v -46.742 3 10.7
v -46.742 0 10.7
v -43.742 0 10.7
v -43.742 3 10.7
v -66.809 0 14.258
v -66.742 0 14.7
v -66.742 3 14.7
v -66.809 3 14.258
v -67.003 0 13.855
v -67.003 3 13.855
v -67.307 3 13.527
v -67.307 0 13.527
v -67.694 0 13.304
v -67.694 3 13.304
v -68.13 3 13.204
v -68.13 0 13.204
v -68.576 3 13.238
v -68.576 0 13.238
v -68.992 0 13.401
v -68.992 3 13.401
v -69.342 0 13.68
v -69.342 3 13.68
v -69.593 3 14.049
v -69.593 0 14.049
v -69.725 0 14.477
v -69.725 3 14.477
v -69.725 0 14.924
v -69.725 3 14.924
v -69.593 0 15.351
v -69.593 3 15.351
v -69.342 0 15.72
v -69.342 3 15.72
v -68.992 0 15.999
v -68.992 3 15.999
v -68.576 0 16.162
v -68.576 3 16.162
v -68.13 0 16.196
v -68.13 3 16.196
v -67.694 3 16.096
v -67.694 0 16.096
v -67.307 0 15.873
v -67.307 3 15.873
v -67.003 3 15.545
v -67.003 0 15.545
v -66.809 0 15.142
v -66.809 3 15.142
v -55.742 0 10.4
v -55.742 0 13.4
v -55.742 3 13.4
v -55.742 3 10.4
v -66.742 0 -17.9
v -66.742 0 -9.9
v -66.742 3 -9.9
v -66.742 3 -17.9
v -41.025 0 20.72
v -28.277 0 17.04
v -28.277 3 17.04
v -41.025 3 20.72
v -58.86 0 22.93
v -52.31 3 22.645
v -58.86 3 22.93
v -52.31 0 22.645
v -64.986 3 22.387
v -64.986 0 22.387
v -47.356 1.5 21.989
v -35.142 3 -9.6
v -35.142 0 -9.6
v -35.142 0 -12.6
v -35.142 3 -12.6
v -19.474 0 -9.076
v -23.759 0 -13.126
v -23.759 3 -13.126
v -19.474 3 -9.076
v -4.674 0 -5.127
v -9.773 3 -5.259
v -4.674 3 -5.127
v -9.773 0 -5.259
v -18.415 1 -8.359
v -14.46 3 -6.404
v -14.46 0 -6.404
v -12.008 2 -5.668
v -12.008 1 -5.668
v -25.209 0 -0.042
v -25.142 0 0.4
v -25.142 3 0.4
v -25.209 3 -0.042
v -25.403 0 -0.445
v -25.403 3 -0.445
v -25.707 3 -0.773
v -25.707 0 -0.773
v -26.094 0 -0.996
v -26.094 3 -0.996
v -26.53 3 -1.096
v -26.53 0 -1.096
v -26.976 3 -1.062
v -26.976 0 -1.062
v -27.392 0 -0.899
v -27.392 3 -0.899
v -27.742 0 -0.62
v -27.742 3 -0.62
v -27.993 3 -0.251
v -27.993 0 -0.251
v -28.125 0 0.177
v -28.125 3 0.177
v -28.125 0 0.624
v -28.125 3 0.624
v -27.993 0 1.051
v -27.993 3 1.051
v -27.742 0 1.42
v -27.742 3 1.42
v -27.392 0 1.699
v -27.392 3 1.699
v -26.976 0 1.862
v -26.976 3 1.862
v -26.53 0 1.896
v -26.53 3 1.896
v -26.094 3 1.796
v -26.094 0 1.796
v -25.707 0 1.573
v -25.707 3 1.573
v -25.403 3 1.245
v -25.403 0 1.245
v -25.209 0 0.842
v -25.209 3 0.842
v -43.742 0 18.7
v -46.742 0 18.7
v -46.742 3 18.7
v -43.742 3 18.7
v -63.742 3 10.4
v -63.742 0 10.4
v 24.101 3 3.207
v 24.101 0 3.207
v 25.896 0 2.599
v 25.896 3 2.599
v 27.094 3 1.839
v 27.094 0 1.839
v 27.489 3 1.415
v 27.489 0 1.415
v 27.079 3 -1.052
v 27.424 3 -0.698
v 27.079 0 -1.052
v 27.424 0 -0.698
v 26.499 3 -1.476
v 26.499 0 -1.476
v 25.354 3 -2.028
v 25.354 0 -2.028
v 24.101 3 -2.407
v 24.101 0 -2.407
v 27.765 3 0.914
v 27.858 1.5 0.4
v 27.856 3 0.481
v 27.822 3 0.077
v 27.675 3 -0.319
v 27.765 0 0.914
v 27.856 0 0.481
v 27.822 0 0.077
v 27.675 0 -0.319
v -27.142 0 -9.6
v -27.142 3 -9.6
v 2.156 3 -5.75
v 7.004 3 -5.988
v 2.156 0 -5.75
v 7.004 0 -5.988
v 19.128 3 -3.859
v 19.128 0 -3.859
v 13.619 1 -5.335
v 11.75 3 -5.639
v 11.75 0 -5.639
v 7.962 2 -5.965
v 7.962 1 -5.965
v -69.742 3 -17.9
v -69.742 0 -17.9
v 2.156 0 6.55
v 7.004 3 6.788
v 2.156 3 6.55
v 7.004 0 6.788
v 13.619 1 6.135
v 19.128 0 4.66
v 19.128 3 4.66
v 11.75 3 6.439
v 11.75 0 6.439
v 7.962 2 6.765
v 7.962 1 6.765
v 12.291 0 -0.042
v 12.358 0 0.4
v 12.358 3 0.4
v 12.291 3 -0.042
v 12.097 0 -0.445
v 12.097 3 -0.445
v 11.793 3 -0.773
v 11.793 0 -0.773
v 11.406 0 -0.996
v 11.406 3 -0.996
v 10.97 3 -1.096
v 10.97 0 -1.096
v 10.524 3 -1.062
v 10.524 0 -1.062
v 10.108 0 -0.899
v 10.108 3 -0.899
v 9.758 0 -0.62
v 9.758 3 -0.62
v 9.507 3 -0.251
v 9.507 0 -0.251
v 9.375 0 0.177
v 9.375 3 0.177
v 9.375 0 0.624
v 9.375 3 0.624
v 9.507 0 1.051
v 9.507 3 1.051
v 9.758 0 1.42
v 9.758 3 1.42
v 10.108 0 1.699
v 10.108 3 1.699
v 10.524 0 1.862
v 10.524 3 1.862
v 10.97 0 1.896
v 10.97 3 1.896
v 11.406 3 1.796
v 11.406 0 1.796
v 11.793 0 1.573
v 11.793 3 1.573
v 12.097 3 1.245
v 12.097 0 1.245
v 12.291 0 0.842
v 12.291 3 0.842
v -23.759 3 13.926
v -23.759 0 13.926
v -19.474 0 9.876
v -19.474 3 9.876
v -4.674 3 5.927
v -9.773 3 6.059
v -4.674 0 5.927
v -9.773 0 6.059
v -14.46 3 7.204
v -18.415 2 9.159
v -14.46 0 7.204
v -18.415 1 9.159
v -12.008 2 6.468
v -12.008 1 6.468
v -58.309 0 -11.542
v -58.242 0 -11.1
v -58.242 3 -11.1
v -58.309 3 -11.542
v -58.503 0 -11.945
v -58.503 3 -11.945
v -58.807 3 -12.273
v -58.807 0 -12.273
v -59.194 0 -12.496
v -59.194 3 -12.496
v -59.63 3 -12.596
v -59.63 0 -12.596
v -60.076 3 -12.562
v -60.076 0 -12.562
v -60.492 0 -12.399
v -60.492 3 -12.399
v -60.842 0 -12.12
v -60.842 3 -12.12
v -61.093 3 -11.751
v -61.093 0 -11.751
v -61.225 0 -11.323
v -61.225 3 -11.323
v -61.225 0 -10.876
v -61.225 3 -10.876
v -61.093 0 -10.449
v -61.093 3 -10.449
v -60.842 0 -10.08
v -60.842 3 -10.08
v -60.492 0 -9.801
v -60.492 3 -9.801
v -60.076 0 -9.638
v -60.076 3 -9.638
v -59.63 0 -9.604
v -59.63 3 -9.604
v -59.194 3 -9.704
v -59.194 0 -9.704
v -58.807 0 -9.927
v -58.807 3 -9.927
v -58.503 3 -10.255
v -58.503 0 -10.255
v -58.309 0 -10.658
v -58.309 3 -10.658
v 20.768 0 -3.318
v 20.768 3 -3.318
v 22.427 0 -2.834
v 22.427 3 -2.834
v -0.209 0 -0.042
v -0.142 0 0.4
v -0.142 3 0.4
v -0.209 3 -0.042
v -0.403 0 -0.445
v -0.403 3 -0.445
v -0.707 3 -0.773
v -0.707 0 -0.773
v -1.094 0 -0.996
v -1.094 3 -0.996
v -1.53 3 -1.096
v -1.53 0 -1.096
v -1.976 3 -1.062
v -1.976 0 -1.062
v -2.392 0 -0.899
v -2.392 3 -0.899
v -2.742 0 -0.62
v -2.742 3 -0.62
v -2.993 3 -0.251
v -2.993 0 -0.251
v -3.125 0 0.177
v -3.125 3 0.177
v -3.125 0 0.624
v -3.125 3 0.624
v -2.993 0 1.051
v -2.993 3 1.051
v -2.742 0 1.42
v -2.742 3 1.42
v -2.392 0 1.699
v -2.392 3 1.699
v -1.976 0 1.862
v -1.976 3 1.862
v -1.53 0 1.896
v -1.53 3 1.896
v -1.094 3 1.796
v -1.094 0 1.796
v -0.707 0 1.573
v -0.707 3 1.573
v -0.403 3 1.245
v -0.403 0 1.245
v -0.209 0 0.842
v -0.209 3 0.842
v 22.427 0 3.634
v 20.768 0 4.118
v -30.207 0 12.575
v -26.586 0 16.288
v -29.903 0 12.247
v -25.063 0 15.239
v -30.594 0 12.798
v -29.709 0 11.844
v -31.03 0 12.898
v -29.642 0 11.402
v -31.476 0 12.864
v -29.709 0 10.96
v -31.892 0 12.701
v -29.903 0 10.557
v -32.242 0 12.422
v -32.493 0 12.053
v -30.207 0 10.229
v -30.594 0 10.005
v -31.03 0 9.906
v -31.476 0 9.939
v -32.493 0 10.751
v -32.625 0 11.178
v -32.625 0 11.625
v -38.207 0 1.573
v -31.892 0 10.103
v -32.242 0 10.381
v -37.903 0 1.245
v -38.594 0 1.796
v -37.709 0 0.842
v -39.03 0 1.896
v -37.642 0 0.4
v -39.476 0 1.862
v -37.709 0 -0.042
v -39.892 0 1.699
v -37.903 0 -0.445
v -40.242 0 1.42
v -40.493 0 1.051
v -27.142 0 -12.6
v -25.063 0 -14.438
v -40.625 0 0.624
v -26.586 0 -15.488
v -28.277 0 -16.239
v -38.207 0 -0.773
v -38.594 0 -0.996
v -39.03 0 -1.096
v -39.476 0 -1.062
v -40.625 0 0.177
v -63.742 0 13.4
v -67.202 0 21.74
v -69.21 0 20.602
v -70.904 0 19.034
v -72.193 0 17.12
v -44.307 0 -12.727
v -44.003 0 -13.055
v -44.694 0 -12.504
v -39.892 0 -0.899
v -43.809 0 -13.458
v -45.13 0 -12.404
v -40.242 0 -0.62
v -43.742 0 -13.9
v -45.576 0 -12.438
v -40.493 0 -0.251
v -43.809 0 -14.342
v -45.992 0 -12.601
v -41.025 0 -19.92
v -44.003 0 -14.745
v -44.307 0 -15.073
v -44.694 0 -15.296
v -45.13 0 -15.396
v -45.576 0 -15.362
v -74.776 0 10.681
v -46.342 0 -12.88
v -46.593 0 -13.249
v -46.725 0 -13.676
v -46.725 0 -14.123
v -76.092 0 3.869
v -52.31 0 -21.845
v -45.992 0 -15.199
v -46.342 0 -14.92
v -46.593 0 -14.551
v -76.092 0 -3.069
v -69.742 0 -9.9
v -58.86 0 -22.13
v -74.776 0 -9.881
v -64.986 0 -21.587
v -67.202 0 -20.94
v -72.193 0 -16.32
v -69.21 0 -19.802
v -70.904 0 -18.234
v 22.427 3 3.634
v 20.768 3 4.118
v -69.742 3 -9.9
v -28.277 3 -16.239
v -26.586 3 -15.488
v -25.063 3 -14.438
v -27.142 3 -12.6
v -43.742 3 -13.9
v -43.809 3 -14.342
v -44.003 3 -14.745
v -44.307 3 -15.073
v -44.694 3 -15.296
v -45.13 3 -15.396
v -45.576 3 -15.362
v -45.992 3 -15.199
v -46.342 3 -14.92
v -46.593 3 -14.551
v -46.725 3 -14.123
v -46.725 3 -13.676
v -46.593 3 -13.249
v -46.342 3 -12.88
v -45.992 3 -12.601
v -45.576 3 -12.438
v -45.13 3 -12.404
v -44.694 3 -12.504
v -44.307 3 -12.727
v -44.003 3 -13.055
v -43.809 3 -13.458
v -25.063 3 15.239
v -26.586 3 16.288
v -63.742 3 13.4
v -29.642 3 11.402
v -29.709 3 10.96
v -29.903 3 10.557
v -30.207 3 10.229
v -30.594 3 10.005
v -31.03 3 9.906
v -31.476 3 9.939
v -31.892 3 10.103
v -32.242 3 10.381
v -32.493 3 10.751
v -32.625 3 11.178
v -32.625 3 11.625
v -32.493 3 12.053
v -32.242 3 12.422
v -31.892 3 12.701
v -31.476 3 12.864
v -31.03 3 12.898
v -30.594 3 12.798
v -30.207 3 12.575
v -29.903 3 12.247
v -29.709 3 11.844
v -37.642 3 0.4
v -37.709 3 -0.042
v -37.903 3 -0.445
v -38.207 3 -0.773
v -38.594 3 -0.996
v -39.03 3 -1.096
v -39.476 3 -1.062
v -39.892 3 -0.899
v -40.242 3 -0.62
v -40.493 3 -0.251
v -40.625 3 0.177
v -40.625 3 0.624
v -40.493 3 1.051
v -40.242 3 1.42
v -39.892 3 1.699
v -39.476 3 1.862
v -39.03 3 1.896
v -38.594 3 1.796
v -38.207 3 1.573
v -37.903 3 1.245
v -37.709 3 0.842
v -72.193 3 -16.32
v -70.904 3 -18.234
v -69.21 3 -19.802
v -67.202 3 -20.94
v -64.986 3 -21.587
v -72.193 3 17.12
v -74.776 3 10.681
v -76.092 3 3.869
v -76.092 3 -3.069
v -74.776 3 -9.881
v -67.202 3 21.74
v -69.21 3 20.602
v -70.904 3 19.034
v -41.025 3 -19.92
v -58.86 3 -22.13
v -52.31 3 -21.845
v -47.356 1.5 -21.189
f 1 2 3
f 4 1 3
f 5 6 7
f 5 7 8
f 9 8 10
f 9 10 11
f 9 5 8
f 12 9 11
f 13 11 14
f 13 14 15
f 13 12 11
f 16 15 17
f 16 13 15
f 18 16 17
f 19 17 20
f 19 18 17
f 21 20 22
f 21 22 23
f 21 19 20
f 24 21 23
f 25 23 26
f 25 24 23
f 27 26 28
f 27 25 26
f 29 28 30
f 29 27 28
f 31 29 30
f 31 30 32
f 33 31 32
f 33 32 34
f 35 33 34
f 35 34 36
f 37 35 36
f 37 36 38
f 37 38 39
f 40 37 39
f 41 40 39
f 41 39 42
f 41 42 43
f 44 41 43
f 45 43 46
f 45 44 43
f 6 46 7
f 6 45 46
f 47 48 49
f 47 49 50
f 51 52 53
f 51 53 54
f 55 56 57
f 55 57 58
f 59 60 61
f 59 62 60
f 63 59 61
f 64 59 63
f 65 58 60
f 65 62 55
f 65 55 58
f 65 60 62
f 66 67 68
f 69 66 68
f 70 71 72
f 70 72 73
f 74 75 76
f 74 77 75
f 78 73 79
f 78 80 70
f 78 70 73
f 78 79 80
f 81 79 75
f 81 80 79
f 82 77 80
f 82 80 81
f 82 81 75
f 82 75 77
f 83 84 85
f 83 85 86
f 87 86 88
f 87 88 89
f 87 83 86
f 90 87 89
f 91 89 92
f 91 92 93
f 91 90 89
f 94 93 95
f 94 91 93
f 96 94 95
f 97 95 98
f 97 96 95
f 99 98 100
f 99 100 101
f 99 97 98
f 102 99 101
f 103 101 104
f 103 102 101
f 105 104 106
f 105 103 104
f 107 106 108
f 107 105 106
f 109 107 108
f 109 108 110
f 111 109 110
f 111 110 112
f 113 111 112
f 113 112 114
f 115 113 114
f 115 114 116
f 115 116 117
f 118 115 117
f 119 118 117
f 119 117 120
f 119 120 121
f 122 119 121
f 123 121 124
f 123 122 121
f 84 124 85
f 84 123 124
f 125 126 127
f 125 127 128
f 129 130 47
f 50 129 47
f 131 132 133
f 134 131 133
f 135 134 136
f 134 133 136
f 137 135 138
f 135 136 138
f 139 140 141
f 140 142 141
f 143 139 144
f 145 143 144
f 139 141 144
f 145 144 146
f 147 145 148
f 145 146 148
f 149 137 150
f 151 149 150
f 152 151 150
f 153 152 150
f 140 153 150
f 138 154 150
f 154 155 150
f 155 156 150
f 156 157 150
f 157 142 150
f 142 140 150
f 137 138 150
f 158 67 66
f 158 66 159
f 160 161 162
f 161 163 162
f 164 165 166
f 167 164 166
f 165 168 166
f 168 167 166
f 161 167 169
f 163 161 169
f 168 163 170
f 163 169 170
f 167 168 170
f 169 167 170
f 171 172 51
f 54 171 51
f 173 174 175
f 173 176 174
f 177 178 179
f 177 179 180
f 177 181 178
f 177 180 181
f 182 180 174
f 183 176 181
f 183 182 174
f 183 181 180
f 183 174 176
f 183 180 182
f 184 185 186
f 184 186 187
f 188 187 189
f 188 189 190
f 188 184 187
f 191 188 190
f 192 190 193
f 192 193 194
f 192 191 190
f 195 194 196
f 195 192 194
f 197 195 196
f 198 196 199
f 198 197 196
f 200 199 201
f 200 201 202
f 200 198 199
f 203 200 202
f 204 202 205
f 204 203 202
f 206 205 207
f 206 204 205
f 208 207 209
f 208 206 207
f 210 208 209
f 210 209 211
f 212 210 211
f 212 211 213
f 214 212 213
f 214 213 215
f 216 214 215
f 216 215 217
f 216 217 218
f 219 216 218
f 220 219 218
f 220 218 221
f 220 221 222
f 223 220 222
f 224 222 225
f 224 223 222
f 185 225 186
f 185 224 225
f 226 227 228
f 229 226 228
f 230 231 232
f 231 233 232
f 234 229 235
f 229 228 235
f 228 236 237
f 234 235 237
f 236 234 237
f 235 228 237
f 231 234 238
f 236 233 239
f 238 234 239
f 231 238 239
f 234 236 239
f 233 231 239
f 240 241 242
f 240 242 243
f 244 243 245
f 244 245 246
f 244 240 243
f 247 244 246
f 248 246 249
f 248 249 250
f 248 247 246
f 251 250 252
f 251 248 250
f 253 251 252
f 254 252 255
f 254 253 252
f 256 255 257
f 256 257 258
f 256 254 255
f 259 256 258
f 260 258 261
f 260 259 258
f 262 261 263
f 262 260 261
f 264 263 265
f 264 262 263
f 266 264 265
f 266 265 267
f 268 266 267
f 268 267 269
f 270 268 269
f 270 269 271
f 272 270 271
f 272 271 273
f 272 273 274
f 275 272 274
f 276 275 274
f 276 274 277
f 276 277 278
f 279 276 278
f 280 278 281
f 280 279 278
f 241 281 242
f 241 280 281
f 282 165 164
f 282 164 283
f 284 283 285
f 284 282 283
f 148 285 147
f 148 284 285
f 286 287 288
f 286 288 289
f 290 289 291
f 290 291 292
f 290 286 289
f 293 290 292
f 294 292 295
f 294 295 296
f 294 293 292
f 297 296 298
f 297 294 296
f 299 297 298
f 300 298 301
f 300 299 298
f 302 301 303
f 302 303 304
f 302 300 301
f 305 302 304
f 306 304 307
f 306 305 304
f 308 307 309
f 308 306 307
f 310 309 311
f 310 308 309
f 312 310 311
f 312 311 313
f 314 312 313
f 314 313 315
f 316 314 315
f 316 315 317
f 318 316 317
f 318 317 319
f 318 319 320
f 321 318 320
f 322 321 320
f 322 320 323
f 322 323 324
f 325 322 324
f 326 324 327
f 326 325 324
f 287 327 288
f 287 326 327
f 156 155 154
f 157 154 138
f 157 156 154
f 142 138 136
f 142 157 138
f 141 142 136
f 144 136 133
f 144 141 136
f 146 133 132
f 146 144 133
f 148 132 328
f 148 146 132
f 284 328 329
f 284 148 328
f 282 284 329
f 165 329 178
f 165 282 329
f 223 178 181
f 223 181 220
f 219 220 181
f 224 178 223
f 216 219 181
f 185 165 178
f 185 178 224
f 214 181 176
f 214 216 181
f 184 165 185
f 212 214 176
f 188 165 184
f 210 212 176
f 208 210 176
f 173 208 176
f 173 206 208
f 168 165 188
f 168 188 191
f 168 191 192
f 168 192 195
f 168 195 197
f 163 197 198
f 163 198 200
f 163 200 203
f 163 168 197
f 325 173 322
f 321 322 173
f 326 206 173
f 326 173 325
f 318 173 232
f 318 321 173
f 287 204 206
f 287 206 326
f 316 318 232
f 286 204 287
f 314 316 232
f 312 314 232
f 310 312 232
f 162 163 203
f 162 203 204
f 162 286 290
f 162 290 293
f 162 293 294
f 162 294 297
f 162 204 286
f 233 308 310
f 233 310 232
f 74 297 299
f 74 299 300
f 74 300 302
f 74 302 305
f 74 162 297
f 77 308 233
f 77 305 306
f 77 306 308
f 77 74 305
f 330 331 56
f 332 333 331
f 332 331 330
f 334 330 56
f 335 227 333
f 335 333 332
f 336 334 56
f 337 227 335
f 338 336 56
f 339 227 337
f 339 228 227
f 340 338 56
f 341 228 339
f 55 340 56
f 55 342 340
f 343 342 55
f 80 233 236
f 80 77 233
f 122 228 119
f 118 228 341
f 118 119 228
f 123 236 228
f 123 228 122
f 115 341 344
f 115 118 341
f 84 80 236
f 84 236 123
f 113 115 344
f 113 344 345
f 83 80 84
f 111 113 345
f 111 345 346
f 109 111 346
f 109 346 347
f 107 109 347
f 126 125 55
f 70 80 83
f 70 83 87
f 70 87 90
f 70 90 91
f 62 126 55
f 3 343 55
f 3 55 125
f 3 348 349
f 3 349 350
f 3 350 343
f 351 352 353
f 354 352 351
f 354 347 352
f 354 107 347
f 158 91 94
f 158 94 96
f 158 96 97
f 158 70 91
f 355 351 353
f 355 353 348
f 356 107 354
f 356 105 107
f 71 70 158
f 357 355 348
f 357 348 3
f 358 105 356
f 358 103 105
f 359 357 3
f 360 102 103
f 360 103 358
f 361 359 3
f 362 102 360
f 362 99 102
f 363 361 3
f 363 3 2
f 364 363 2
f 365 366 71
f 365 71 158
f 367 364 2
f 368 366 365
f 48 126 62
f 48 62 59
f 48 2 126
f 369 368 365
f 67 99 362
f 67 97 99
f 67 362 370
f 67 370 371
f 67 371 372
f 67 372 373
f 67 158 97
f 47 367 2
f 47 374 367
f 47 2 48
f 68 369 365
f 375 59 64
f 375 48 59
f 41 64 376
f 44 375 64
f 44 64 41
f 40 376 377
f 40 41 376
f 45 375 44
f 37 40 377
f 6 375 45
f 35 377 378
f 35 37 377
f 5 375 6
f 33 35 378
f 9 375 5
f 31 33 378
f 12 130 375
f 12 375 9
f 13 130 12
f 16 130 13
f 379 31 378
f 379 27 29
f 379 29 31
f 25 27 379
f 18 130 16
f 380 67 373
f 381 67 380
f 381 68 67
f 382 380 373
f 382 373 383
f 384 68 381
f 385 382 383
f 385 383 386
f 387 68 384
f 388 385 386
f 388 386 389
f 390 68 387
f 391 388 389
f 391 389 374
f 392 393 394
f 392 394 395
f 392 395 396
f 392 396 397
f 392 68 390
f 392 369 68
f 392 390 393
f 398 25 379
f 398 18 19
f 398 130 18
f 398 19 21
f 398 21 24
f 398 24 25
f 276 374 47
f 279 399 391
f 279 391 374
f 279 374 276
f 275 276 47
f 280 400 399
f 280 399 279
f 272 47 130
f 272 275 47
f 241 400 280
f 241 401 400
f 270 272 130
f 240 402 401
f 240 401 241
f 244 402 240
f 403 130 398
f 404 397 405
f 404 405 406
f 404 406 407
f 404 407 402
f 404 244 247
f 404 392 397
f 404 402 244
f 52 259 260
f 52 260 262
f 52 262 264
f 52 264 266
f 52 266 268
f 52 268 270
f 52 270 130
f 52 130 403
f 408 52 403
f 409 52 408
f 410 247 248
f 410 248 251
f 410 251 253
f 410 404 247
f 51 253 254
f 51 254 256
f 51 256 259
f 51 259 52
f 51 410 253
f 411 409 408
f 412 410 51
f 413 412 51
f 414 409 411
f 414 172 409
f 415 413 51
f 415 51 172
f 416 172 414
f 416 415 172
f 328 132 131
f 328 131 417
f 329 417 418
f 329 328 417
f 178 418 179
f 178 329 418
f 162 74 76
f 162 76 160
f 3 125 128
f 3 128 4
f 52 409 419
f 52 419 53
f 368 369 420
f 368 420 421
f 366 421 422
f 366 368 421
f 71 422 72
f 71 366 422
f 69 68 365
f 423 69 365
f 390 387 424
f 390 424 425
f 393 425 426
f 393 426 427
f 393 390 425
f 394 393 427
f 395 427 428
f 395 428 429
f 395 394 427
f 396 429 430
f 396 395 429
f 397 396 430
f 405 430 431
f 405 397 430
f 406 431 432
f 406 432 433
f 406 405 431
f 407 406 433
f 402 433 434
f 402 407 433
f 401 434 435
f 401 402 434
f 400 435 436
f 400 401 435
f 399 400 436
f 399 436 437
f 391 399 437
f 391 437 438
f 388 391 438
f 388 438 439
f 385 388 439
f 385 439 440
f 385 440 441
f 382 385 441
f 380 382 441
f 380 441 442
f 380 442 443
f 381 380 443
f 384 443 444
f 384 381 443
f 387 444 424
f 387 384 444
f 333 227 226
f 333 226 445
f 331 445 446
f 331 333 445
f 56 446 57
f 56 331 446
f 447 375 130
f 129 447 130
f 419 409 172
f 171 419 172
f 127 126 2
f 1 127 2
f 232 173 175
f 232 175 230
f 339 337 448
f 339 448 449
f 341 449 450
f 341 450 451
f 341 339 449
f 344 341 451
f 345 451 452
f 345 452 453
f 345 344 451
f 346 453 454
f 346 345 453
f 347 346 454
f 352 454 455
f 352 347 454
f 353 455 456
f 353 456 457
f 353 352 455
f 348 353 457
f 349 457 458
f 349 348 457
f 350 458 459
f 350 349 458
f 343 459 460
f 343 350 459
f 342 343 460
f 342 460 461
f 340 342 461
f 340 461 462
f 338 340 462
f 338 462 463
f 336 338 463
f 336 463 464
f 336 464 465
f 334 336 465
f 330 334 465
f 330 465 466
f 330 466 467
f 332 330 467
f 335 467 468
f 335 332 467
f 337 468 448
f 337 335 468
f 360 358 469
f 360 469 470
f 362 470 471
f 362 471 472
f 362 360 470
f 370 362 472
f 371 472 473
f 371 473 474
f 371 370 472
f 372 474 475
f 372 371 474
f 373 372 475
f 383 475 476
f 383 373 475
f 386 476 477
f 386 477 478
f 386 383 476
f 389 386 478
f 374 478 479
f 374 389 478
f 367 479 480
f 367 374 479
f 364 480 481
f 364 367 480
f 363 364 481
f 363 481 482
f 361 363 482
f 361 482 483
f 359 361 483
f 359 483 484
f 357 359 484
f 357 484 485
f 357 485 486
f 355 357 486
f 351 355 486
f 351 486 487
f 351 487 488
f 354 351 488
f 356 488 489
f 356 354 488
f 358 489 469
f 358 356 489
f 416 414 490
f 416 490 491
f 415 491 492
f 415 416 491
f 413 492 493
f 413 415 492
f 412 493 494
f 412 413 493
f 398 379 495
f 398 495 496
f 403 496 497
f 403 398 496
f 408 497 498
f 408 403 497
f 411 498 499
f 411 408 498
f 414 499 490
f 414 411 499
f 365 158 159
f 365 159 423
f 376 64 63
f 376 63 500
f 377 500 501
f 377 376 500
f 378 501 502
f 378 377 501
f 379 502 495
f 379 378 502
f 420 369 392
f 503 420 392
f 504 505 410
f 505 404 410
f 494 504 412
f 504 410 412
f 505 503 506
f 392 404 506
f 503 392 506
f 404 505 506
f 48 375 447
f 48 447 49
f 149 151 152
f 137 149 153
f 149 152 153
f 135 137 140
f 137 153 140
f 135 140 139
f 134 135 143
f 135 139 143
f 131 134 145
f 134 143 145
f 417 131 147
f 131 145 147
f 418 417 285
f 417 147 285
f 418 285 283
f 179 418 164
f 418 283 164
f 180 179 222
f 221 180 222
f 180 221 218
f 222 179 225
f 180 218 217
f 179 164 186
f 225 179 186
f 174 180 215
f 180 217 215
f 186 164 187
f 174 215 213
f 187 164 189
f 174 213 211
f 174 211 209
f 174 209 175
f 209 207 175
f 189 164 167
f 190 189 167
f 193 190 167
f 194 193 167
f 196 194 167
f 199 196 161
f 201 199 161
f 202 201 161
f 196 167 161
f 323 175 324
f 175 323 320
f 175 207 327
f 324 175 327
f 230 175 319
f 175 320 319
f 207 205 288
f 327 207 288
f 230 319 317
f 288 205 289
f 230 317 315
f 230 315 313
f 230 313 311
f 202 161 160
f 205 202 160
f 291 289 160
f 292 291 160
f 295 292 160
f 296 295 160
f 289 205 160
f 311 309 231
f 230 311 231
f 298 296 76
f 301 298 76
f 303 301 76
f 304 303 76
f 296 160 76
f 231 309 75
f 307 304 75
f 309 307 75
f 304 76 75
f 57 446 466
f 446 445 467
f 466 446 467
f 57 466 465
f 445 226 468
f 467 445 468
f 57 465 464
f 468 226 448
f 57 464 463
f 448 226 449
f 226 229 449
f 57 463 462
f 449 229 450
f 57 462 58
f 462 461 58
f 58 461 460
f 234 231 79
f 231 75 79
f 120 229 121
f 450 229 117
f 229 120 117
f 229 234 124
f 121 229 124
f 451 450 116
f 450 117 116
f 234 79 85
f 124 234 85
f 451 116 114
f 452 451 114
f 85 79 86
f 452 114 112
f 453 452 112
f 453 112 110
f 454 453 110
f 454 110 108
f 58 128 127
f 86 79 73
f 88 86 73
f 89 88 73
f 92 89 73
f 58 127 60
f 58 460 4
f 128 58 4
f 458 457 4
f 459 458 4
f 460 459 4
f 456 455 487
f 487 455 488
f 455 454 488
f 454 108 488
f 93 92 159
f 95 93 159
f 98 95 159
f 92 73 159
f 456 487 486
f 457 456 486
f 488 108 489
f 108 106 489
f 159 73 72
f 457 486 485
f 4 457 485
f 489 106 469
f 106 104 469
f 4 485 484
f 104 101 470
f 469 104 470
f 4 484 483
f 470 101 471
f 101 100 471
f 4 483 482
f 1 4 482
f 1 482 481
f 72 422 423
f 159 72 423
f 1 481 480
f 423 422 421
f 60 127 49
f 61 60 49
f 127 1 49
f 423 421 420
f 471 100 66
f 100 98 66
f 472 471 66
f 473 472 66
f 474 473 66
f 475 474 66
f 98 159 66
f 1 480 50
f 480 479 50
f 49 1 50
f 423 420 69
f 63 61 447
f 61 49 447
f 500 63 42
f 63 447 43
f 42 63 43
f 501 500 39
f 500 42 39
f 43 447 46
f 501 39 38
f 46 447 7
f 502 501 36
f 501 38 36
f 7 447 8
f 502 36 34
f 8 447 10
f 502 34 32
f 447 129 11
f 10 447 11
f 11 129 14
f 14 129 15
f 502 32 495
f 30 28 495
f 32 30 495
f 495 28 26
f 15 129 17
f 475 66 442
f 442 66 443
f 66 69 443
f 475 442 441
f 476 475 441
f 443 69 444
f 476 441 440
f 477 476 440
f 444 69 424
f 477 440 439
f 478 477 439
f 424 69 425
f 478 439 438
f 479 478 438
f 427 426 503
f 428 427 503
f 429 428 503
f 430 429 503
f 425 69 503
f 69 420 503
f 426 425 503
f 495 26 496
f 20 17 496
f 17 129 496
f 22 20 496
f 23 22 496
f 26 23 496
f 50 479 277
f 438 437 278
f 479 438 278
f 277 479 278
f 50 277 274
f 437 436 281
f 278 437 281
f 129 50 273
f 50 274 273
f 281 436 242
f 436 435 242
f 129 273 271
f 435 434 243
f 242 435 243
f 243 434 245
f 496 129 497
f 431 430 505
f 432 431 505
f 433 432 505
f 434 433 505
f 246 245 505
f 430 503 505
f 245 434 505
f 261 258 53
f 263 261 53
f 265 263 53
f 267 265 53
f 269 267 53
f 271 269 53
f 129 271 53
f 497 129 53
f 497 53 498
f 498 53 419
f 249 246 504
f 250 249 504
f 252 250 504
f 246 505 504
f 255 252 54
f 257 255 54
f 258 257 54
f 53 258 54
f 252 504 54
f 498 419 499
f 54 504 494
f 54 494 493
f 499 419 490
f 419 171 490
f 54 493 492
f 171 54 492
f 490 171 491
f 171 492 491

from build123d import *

# Parameters (mm, degrees)
ESBO_O1_R                = 1.5
ESBO_O1_W                = 3
ESBO_O1_H                = 8
ESBO_O1_W_2              = 8
ESBO_O1_H_2              = 3
RESSALTO_EXTRUS_O1_DEPTH = 3


with BuildPart() as part:
    # Esboço1 → Ressalto-extrusão1 (new body)
    with BuildSketch(Plane(origin=(0, 0, 0), x_dir=(1, 0, 0), z_dir=(0, 1, 0))):
        with BuildLine():
            Line((-4.674449837, 5.126823449), (2.15649844, 5.74992269))
            add(Edge.make_bspline(
                [(19.127700004, 3.859391667), (13.692888976, 5.757269931), (8.035822873, 6.387450044), (2.15649844, 5.74992269)],
                knots=[0.35388944, 0.35388944, 0.35388944, 0.35388944, 1, 1, 1, 1], degree=3))
            ThreePointArc((19.127700004, 3.859391667), (21.595587829, 3.06871935), (24.101127023, 2.406974398))
            add(Edge.make_bspline(
                [(24.101129521, -3.20712694), (35.966754752, -0.40007519), (24.101127023, 2.406974398)],
                knots=[5.194112275, 5.194112275, 5.194112275, 7.372258742, 7.372258742, 7.372258742], degree=2, weights=[1, 0.463306864, 1]))
            ThreePointArc((24.101129521, -3.20712694), (21.595589041, -3.868872862), (19.127700004, -4.659546287))
            add(Edge.make_bspline(
                [(19.127700004, -4.659546287), (13.692889505, -6.55742607), (8.035822337, -7.187603127), (2.15649844, -6.55007731)],
                knots=[0.35388944, 0.35388944, 0.35388944, 0.35388944, 1, 1, 1, 1], degree=3))
            Line((2.15649844, -6.55007731), (-4.674449837, -5.926978069))
            add(Edge.make_bspline(
                [(-23.759026807, -13.92609603), (-18.993134449, -8.145749128), (-12.424143506, -5.367564321), (-4.674449837, -5.926978069)],
                knots=[0.101821695, 0.101821695, 0.101821695, 0.101821695, 1, 1, 1, 1], degree=3))
            ThreePointArc((-23.759026807, -13.92609603), (-25.800414194, -15.798822034), (-28.277263571, -17.039621097))
            add(Edge.make_bspline(
                [(-28.277263571, -17.039621097), (-34.579205058, -19.166234), (-47.597806191, -22.747709276), (-59.650258973, -23.294853785), (-64.986052109, -22.387135922)],
                knots=[0.241589655, 0.241589655, 0.241589655, 0.241589655, 0.401358205, 0.561126756, 0.561126756, 0.561126756, 0.561126756], degree=3))
            ThreePointArc((-64.986052109, -22.387135922), (-69.209775007, -20.602207926), (-72.192804257, -17.119774932))
            ThreePointArc((-72.192804257, -17.119774932), (-76.257665323, -0.40007754), (-72.192804468, 16.319619904))
            ThreePointArc((-72.192804468, 16.319619904), (-69.209774999, 19.802053128), (-64.986051746, 21.586981094))
            add(Edge.make_bspline(
                [(-28.2772637, 16.239466453), (-34.57920511, 18.366079177), (-47.597806077, 21.947554059), (-59.650258689, 22.494698656), (-64.986051746, 21.586981094)],
                knots=[0.241589656, 0.241589656, 0.241589656, 0.241589656, 0.401358204, 0.561126752, 0.561126752, 0.561126752, 0.561126752], degree=3))
            ThreePointArc((-28.2772637, 16.239466453), (-25.80041422, 14.998667392), (-23.759026751, 13.125941342))
            add(Edge.make_bspline(
                [(-23.759026751, 13.125941342), (-18.993134399, 7.345594488), (-12.424143468, 4.567409699), (-4.674449837, 5.126823449)],
                knots=[0.101821698, 0.101821698, 0.101821698, 0.101821698, 1, 1, 1, 1], degree=3))
        make_face()
        with Locations((-45.242023738, 13.89992269)):
            Circle(ESBO_O1_R, mode=Mode.SUBTRACT)
        with Locations((-68.242023738, -14.70007731)):
            Circle(ESBO_O1_R, mode=Mode.SUBTRACT)
        with Locations((-59.742023738, 11.09992269)):
            Circle(ESBO_O1_R, mode=Mode.SUBTRACT)
        with Locations((-31.142023738, -11.40175485)):
            Circle(ESBO_O1_R, mode=Mode.SUBTRACT)
        with Locations((-39.142023738, -0.40007731)):
            Circle(ESBO_O1_R, mode=Mode.SUBTRACT)
        with Locations((10.857976262, -0.40007731)):
            Circle(ESBO_O1_R, mode=Mode.SUBTRACT)
        with Locations((-1.642023738, -0.40007731)):
            Circle(ESBO_O1_R, mode=Mode.SUBTRACT)
        with Locations((-26.642023738, -0.40007731)):
            Circle(ESBO_O1_R, mode=Mode.SUBTRACT)
        with Locations((-45.242023738, -14.70007731)):
            Rectangle(ESBO_O1_W, ESBO_O1_H, mode=Mode.SUBTRACT)
        with Locations((-68.242023738, 13.89992269)):
            Rectangle(ESBO_O1_W, ESBO_O1_H, mode=Mode.SUBTRACT)
        with Locations((-31.142023738, 11.099922699)):
            Rectangle(ESBO_O1_W_2, ESBO_O1_H_2, mode=Mode.SUBTRACT)
        with Locations((-59.742023738, -11.90007731)):
            Rectangle(ESBO_O1_W_2, ESBO_O1_H_2, mode=Mode.SUBTRACT)
    extrude(amount=RESSALTO_EXTRUS_O1_DEPTH)


solid = part.part
